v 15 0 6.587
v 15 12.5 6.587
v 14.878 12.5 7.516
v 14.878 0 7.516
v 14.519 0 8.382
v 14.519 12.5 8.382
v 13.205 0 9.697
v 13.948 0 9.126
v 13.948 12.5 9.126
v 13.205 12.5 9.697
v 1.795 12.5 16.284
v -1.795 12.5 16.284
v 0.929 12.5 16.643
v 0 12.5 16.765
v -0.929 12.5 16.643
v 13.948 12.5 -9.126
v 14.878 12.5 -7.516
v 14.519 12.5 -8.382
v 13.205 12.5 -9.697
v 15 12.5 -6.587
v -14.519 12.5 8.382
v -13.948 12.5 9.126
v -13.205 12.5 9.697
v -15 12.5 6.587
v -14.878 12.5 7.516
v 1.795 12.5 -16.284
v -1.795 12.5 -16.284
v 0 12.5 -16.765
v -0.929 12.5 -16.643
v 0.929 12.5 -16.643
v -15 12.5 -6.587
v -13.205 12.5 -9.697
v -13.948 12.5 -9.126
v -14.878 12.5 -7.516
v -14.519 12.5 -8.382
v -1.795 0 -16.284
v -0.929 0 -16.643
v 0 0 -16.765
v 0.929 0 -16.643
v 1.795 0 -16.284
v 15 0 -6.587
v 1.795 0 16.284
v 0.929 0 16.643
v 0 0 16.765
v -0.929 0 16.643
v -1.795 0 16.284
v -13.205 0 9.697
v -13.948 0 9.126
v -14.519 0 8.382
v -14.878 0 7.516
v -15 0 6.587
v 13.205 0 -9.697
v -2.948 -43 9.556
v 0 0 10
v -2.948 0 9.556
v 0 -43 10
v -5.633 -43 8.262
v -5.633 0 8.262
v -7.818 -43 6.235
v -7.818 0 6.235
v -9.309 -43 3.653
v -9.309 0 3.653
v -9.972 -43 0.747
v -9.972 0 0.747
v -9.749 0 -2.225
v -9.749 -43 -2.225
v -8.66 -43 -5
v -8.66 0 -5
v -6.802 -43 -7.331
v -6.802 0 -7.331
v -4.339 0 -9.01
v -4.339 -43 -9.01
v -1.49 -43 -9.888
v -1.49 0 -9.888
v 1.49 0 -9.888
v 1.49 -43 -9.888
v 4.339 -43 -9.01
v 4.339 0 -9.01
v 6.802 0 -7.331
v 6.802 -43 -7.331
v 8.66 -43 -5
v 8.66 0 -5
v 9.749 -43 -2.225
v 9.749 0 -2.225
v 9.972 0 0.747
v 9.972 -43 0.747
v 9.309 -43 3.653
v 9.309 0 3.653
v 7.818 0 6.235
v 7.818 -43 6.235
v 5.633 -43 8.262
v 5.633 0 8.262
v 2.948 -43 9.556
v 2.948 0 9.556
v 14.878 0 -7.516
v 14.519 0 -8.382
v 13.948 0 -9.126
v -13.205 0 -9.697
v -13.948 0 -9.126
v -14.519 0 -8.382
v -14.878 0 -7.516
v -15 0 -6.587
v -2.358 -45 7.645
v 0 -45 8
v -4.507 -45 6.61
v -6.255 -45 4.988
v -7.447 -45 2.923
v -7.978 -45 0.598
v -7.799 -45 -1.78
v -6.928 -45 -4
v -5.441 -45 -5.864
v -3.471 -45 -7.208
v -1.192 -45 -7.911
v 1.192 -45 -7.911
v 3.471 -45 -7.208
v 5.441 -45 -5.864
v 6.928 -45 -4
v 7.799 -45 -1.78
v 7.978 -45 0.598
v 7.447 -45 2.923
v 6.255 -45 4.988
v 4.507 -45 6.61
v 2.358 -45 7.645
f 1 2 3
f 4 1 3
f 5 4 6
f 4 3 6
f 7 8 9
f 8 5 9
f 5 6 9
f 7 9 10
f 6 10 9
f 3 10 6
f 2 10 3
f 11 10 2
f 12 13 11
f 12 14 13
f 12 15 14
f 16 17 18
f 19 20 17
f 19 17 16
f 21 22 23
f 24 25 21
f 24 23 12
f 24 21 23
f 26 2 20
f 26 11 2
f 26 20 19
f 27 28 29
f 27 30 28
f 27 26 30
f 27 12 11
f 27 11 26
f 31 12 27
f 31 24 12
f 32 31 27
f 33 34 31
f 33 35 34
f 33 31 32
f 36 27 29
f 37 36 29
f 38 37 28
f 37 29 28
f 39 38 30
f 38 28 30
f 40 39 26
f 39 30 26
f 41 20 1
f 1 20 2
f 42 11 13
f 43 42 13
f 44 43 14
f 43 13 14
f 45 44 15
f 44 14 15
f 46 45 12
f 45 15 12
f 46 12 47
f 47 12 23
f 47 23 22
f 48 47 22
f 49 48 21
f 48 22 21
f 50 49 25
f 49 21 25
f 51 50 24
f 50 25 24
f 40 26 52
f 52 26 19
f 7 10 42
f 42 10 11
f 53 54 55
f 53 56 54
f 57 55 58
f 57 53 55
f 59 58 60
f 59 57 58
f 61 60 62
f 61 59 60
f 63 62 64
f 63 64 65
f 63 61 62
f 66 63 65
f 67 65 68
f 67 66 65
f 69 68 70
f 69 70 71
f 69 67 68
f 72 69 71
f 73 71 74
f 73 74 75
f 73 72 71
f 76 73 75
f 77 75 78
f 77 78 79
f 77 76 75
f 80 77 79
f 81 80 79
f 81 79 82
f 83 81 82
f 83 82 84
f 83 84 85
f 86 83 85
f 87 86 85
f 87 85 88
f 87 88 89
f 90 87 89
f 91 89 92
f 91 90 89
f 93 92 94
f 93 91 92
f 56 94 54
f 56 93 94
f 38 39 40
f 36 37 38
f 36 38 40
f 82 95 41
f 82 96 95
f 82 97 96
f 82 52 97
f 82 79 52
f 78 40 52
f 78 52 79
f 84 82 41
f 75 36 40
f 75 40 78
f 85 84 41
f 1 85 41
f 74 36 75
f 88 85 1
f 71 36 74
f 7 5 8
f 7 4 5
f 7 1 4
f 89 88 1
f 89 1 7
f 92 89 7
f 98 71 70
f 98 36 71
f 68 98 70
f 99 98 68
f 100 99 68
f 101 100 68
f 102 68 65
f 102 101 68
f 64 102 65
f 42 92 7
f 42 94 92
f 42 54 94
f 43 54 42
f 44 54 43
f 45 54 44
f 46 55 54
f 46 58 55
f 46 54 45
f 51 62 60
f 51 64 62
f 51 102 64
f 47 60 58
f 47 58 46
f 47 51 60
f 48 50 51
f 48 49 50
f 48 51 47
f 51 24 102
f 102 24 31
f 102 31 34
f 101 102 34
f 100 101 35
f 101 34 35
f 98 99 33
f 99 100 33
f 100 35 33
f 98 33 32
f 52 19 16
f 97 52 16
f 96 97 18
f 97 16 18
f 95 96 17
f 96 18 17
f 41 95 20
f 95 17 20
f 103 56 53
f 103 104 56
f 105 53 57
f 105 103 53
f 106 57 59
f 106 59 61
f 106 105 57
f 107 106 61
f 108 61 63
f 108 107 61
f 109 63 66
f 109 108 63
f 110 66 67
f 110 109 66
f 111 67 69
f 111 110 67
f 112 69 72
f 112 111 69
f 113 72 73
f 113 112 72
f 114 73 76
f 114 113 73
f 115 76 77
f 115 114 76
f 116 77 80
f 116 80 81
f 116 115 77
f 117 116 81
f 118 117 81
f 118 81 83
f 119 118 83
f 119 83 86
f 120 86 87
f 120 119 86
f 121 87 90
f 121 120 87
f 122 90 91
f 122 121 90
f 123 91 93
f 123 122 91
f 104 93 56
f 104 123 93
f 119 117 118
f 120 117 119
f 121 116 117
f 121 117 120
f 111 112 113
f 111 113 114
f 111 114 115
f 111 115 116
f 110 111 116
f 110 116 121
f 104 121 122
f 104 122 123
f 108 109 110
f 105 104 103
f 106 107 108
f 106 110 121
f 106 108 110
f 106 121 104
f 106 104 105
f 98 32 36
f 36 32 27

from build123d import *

# Parameters (mm, degrees)
F2_R     = 25.1475
F3_DEPTH = 25


# Not quite as in the source:
# - a feature names something its author has since deleted; it is built from what else it names


with BuildPart() as f1:
    # F0 (on Right) → F1 (revolve)
    with BuildSketch(Plane.YZ):
        Polygon((0, 25.1475), (0, 10), (-43, 10), (-45, 8), (-45, 0), (12.5, 0), (12.5, 25.1475), align=None)
    revolve(axis=Axis((0, -16.25, 0), (0, -1, 0)))

    # F2 (on face) → F3 (cut)
    with BuildSketch(Plane(origin=(0, 12.5, 0), x_dir=(-1, 0, 0), z_dir=(0, 1, 0))):
        Circle(F2_R)
        with BuildLine():
            ThreePointArc((1.7954303246, -16.2839158944), (0, -16.765), (-1.7954303246, -16.2839158944))
            Line((-1.7954303246, -16.2839158944), (-13.2045696754, -9.6968462191))
            ThreePointArc((-13.2045696754, -9.6968462191), (-14.5189158944, -8.3825), (-15, -6.5870696754))
            Line((-15, -6.5870696754), (-15, 6.5870696754))
            ThreePointArc((-15, 6.5870696754), (-14.5189158944, 8.3825), (-13.2045696754, 9.6968462191))
            Line((-13.2045696754, 9.6968462191), (-1.7954303246, 16.2839158944))
            ThreePointArc((-1.7954303246, 16.2839158944), (0, 16.765), (1.7954303246, 16.2839158944))
            Line((1.7954303246, 16.2839158944), (13.2045696754, 9.6968462191))
            ThreePointArc((13.2045696754, 9.6968462191), (14.5189158944, 8.3825), (15, 6.5870696754))
            Line((15, 6.5870696754), (15, -6.5870696754))
            ThreePointArc((15, -6.5870696754), (14.5189158944, -8.3825), (13.2045696754, -9.6968462191))
            Line((13.2045696754, -9.6968462191), (1.7954303246, -16.2839158944))
        make_face(mode=Mode.SUBTRACT)
    extrude(amount=-F3_DEPTH, mode=Mode.SUBTRACT)


solid = f1.part
